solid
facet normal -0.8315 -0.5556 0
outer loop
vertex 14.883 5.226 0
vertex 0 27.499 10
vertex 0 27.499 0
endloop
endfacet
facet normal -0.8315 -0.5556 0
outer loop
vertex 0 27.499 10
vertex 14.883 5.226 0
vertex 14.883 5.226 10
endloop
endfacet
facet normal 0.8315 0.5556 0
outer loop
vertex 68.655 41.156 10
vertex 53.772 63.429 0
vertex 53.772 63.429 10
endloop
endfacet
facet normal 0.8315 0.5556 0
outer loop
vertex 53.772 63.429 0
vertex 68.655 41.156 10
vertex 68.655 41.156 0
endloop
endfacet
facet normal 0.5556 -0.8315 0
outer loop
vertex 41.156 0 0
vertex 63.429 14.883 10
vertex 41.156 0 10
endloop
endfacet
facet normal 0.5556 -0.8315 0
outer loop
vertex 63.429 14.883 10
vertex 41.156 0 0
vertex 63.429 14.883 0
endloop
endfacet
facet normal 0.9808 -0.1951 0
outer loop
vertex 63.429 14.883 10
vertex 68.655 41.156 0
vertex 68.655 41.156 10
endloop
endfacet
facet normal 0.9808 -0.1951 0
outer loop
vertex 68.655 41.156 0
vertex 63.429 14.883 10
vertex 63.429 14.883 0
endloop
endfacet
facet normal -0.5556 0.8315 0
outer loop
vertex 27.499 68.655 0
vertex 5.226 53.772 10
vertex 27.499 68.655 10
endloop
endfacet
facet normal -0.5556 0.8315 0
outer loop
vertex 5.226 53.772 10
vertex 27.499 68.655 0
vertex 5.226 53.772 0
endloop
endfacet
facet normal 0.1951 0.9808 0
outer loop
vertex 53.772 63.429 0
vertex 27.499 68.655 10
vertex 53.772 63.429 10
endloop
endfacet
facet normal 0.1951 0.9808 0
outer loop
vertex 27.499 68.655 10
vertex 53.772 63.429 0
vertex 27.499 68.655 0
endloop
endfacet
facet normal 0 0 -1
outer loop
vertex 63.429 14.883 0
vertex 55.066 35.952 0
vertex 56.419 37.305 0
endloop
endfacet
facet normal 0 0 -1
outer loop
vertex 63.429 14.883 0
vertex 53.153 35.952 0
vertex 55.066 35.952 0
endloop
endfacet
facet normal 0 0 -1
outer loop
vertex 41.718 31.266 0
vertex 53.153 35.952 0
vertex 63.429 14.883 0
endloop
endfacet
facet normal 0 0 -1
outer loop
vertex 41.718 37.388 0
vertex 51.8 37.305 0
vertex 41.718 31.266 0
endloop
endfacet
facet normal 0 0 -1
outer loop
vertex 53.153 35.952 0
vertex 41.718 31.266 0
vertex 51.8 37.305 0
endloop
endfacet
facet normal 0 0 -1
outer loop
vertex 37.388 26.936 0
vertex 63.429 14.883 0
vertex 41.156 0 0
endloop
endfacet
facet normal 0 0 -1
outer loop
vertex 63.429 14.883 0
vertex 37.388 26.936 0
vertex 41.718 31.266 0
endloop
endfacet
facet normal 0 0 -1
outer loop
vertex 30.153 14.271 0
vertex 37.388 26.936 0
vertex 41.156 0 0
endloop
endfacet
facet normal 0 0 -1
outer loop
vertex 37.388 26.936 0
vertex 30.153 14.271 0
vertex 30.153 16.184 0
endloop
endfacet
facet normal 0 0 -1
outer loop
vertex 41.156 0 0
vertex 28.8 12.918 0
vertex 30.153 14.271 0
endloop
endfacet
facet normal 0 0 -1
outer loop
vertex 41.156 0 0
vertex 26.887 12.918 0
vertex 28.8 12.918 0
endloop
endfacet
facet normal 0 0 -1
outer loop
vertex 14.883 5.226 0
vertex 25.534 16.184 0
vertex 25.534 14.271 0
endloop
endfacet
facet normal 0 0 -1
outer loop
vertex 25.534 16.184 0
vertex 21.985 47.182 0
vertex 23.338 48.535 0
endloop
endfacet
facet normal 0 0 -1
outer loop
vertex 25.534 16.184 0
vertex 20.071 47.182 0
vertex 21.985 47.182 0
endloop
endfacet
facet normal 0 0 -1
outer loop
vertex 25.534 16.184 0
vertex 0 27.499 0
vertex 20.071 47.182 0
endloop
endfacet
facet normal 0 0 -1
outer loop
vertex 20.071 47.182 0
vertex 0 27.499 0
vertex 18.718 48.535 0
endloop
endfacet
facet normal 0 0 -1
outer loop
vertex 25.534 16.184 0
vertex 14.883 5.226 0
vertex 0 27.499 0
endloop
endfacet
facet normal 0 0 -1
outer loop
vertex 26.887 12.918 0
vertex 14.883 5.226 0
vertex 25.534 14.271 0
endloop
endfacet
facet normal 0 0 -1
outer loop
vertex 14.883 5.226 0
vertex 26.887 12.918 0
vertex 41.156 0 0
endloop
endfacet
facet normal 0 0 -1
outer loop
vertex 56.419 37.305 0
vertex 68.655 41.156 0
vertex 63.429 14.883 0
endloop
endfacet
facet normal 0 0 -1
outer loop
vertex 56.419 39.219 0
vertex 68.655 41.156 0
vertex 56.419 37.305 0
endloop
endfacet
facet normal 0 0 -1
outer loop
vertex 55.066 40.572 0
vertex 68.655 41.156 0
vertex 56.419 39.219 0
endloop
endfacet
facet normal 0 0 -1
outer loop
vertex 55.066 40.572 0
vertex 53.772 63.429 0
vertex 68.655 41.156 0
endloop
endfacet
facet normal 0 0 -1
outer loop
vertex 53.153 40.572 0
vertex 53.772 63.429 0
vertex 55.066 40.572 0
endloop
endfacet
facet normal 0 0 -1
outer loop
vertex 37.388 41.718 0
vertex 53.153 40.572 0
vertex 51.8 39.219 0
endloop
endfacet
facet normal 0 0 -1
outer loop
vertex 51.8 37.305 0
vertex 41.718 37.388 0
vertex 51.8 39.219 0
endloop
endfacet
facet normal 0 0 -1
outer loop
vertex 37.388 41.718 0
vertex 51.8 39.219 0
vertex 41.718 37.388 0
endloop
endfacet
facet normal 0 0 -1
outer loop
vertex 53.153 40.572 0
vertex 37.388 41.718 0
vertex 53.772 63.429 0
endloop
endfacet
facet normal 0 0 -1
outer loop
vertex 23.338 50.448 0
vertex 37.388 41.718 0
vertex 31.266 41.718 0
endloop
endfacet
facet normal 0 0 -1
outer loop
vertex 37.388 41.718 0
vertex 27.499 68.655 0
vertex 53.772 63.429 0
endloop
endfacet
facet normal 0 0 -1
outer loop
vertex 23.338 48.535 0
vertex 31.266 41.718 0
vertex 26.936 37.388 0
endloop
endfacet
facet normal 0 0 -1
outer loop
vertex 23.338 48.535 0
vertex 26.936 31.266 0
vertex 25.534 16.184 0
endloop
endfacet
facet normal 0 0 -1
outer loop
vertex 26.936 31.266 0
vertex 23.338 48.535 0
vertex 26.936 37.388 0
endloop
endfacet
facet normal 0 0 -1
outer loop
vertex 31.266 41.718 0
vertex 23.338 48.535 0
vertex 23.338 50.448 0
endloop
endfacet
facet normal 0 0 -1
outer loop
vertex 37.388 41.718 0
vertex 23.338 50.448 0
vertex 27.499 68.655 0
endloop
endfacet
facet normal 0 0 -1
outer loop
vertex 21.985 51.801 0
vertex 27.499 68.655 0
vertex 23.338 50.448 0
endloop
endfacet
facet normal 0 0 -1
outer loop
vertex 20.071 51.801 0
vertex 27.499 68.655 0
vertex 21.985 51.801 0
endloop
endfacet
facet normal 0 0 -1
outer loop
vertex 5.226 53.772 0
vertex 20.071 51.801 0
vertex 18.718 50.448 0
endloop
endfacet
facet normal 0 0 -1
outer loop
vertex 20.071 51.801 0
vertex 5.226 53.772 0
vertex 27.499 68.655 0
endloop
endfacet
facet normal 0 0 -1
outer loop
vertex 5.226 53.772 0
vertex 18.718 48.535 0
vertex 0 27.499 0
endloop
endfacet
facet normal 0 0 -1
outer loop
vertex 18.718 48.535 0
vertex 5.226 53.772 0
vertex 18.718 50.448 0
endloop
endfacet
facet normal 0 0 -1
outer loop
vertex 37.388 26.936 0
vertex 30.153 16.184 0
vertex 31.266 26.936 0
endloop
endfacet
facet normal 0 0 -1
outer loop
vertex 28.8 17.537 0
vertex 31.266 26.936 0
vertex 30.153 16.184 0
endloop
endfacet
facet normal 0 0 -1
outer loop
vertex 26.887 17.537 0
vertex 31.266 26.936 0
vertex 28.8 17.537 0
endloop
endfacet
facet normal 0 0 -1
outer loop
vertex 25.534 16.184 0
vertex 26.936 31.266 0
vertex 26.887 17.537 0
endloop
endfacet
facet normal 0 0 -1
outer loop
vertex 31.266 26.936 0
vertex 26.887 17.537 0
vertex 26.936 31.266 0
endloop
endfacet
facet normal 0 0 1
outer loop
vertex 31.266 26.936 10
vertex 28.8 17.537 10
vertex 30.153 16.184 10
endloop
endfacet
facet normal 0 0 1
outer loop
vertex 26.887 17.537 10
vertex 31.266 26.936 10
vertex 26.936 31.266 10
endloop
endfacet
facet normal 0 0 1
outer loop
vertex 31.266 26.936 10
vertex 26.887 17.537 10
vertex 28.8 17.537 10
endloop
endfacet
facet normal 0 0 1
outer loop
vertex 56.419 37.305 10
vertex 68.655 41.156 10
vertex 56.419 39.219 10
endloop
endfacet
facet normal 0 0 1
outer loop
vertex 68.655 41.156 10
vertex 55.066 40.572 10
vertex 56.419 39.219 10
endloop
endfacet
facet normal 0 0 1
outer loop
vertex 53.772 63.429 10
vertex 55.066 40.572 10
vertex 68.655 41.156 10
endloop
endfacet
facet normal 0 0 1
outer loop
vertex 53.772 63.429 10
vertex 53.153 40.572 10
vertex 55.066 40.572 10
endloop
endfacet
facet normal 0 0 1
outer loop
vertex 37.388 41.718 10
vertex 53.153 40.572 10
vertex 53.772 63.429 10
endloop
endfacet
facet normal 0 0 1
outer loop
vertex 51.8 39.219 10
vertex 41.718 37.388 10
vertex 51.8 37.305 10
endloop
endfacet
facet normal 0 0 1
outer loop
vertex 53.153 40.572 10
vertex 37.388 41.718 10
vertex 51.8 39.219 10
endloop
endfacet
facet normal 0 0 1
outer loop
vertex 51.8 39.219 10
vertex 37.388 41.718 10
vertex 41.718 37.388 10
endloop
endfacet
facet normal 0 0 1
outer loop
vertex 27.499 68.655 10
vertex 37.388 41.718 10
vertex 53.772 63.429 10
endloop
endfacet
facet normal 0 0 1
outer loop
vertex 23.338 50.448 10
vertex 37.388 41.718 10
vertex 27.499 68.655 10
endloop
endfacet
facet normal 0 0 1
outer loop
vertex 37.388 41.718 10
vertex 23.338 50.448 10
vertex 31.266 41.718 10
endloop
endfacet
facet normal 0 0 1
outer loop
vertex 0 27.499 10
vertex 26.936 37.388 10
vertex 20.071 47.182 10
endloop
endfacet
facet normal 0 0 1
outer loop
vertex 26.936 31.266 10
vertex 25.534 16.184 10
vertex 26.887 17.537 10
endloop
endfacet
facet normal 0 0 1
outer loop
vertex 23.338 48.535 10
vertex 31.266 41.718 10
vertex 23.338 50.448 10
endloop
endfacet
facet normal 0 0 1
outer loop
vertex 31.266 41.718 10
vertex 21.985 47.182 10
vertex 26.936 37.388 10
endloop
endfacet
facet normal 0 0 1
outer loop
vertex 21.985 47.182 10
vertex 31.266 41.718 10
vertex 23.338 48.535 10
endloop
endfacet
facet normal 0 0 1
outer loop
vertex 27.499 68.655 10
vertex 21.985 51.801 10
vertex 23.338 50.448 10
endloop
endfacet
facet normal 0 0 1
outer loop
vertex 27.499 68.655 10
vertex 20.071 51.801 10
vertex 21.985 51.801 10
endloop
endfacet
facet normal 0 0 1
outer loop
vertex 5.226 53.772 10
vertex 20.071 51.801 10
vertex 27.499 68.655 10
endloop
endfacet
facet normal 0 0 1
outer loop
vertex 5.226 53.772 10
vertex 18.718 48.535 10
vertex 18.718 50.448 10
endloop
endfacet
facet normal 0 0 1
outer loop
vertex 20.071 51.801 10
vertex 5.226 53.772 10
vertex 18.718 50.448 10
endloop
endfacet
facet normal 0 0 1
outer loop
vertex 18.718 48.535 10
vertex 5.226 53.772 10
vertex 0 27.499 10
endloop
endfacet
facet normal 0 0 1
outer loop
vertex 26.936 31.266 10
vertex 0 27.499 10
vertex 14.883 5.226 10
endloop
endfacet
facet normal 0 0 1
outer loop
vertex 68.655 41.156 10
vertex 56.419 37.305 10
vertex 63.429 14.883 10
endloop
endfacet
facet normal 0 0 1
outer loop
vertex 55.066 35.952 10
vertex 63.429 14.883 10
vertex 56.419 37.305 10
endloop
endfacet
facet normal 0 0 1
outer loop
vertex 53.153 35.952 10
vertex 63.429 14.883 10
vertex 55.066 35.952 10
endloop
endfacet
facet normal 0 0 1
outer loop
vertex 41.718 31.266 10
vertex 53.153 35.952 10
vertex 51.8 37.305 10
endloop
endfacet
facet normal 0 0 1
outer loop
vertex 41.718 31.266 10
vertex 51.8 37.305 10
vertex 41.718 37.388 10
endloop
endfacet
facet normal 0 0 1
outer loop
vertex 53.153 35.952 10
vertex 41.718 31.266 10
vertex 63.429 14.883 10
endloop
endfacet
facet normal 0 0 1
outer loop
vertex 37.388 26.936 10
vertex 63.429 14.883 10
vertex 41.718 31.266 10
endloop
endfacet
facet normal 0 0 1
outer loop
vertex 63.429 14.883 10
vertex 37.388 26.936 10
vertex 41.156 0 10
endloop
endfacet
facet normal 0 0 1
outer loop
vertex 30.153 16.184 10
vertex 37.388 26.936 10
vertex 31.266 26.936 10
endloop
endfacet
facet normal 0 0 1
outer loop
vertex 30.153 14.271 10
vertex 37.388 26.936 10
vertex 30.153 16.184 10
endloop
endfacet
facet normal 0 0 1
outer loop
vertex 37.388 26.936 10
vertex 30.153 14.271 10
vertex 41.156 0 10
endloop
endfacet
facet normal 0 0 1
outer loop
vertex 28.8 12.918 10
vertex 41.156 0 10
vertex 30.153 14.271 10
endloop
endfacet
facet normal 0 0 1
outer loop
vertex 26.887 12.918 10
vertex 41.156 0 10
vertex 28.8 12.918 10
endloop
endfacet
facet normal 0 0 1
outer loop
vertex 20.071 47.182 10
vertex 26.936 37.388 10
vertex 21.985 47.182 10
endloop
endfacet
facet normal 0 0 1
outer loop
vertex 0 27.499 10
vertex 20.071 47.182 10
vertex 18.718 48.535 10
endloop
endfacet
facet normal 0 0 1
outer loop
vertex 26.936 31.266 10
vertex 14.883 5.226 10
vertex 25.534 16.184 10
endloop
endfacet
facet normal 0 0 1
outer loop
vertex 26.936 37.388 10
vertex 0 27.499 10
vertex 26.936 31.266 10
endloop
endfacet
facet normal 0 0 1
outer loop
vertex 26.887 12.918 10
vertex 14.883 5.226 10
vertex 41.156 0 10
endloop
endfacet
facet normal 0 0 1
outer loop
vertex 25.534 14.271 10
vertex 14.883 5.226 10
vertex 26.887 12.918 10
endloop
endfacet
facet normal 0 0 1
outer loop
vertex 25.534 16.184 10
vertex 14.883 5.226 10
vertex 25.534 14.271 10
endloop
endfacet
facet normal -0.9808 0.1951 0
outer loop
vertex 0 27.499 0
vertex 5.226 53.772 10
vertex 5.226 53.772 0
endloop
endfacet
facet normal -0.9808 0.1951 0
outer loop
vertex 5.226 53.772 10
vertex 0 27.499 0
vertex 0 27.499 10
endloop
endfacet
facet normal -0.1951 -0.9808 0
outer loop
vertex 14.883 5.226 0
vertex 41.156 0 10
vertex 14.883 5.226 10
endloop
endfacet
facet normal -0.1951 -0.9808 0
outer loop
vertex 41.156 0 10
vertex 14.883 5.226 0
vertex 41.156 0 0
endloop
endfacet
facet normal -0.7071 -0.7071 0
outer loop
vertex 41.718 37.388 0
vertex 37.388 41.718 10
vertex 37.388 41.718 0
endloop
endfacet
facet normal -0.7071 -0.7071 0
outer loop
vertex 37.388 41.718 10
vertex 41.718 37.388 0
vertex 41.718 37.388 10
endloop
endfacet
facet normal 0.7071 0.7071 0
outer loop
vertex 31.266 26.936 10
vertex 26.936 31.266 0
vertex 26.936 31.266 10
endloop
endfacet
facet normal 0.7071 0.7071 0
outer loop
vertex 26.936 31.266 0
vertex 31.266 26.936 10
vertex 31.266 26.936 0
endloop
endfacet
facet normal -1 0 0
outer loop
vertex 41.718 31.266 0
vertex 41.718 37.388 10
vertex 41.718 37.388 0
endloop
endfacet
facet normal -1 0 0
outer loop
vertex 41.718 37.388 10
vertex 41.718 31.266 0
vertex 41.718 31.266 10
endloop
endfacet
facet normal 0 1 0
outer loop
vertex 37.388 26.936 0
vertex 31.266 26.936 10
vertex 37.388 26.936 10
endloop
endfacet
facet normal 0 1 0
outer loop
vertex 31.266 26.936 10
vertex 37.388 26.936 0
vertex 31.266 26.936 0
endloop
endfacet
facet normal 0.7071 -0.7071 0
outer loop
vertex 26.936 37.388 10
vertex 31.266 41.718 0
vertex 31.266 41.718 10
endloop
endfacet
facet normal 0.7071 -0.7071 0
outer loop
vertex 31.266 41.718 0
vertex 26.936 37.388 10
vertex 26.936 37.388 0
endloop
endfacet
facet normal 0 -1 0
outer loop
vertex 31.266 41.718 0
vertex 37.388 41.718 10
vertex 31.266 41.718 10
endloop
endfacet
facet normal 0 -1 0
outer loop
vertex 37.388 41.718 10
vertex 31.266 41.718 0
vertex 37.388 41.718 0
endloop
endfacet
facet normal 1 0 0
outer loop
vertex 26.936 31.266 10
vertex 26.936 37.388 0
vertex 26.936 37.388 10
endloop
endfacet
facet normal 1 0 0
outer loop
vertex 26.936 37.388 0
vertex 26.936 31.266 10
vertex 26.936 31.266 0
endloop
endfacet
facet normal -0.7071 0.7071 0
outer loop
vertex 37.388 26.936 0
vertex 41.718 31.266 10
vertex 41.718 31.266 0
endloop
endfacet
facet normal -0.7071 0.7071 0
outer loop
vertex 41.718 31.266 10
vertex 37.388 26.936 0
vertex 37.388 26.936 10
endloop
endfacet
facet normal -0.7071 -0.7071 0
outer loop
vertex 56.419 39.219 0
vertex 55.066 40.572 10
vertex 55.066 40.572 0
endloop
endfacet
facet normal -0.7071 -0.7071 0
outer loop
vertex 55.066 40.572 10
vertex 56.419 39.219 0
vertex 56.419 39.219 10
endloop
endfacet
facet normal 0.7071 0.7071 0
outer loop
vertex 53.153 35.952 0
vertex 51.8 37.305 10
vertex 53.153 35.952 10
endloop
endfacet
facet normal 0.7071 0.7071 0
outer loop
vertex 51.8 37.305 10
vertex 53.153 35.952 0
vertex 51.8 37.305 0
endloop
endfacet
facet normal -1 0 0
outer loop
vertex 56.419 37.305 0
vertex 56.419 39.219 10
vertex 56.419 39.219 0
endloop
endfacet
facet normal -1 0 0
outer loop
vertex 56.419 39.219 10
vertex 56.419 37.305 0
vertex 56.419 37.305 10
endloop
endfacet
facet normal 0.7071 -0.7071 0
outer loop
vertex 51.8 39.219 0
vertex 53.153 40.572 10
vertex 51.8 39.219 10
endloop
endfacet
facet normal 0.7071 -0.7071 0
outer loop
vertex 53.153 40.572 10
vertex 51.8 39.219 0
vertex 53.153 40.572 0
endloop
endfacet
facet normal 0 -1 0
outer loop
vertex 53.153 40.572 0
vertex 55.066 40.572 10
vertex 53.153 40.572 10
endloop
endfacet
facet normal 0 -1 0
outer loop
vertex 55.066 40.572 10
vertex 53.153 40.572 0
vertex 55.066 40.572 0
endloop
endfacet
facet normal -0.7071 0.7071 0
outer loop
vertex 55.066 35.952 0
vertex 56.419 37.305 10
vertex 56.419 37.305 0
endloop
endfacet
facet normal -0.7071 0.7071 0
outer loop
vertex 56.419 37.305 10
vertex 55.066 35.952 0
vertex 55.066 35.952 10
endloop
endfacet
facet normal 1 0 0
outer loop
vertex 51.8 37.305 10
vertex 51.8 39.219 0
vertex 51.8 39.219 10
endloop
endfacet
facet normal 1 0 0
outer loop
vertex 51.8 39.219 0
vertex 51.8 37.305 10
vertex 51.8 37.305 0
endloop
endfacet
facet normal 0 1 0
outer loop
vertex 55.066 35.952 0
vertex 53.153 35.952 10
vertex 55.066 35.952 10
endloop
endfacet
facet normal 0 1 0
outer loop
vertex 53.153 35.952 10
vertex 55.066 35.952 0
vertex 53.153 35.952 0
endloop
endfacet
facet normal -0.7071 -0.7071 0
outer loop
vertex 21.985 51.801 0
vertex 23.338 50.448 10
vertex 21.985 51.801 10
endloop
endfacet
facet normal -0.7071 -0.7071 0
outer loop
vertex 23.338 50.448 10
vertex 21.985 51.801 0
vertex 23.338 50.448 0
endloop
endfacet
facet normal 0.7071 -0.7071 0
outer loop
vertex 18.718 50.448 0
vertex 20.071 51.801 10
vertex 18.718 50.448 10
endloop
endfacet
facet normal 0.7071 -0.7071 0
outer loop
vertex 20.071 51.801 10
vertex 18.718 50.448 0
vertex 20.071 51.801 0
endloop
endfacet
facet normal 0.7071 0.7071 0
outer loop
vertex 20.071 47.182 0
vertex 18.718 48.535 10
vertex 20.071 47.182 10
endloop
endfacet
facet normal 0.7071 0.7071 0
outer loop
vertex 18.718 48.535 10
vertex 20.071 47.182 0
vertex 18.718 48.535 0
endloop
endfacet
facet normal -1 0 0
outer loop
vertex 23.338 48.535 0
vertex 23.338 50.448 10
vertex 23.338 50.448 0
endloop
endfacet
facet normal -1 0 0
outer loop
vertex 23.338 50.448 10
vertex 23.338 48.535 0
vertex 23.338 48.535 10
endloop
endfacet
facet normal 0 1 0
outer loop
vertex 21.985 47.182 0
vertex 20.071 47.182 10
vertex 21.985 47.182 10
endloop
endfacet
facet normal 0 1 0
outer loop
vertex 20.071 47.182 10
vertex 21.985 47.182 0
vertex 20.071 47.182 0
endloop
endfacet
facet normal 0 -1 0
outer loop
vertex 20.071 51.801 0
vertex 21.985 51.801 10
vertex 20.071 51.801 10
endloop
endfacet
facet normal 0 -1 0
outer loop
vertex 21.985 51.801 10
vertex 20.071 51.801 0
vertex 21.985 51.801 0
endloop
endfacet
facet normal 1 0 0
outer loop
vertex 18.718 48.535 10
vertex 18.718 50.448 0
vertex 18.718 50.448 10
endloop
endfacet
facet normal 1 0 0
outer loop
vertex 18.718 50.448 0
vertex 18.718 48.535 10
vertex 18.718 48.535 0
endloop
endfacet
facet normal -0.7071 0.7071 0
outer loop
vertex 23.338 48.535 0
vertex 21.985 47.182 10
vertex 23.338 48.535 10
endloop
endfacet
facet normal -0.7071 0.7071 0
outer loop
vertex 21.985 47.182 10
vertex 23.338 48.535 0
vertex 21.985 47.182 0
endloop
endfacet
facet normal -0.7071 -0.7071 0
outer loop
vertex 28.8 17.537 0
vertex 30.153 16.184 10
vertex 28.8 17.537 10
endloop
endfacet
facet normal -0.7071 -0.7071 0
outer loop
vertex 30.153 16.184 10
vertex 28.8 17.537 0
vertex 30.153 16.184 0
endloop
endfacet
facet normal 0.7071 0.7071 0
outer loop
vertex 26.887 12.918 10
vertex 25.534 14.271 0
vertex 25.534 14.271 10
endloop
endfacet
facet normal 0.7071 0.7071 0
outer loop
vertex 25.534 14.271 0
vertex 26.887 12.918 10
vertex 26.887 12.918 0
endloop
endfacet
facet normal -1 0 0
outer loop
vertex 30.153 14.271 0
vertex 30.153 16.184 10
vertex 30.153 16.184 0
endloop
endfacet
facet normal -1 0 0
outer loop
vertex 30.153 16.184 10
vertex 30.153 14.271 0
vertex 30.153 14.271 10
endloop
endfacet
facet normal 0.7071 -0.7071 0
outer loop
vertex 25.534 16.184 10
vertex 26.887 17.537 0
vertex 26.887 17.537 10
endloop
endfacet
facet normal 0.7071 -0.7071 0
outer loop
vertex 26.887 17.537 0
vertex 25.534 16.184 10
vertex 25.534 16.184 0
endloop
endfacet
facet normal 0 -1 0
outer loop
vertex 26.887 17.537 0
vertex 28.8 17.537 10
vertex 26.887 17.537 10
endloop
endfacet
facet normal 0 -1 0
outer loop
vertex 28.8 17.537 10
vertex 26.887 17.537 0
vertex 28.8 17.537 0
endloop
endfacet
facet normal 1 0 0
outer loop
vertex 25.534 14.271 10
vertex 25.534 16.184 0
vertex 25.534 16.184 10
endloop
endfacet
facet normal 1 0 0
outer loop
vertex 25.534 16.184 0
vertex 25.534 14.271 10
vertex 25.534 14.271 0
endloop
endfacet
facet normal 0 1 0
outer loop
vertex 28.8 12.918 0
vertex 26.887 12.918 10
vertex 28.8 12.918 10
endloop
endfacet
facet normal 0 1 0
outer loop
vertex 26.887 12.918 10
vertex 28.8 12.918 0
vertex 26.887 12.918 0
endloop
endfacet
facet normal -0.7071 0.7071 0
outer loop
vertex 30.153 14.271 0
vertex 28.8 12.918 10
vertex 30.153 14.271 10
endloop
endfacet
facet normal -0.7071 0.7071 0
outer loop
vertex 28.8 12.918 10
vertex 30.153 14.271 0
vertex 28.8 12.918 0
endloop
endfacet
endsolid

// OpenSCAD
$fn = 32;

// ----------------------------------------------------------------------
// Polygon plate: 8-gon R35, 3 bolt windows
// ----------------------------------------------------------------------

// --- parameters (mm) ---
sides = 8;                // number of polygon sides
plate_r = 35;             // circumscribed radius of the polygon
bore_r = 8;               // centre bore radius
bolts = 3;                // number of bolt windows
ring_r = 20.17;           // bolt-circle radius
bolt_r = 2.5;             // bolt window radius
plate_t = 10;             // plate thickness, Z (extrusion height)

plate_d = 2 * plate_r;  // circumscribed diameter
bore_d = 2 * bore_r;  // centre bore diameter
bolt_d = 2 * bolt_r;  // bolt window diameter
ring_d = 2 * ring_r;  // bolt-circle diameter

profile = [[68.655, 41.156], [53.772, 63.429], [27.499, 68.655], [5.226, 53.772], [0, 27.499], [14.883, 5.226], [41.156, 0], [63.429, 14.883]];  // primary outline, 8 points, counter clockwise
void_1 = [[41.718, 37.388], [37.388, 41.718], [31.266, 41.718], [26.936, 37.388], [26.936, 31.266], [31.266, 26.936], [37.388, 26.936], [41.718, 31.266]];  // centre bore, 8 points
void_2 = [[56.419, 39.219], [55.066, 40.572], [53.153, 40.572], [51.8, 39.219], [51.8, 37.305], [53.153, 35.952], [55.066, 35.952], [56.419, 37.305]];  // bolt window 1, 8 points
void_3 = [[23.338, 50.448], [21.985, 51.801], [20.071, 51.801], [18.718, 50.448], [18.718, 48.535], [20.071, 47.182], [21.985, 47.182], [23.338, 48.535]];  // bolt window 2, 8 points
void_4 = [[30.153, 16.184], [28.8, 17.537], [26.887, 17.537], [25.534, 16.184], [25.534, 14.271], [26.887, 12.918], [28.8, 12.918], [30.153, 14.271]];  // bolt window 3, 8 points

// --- the one profile operation ---
difference() {
  linear_extrude(height = plate_t) polygon(points = profile);
  translate([0, 0, -1])
    linear_extrude(height = plate_t + 2) polygon(points = void_1);
  translate([0, 0, -1])
    linear_extrude(height = plate_t + 2) polygon(points = void_2);
  translate([0, 0, -1])
    linear_extrude(height = plate_t + 2) polygon(points = void_3);
  translate([0, 0, -1])
    linear_extrude(height = plate_t + 2) polygon(points = void_4);
}
